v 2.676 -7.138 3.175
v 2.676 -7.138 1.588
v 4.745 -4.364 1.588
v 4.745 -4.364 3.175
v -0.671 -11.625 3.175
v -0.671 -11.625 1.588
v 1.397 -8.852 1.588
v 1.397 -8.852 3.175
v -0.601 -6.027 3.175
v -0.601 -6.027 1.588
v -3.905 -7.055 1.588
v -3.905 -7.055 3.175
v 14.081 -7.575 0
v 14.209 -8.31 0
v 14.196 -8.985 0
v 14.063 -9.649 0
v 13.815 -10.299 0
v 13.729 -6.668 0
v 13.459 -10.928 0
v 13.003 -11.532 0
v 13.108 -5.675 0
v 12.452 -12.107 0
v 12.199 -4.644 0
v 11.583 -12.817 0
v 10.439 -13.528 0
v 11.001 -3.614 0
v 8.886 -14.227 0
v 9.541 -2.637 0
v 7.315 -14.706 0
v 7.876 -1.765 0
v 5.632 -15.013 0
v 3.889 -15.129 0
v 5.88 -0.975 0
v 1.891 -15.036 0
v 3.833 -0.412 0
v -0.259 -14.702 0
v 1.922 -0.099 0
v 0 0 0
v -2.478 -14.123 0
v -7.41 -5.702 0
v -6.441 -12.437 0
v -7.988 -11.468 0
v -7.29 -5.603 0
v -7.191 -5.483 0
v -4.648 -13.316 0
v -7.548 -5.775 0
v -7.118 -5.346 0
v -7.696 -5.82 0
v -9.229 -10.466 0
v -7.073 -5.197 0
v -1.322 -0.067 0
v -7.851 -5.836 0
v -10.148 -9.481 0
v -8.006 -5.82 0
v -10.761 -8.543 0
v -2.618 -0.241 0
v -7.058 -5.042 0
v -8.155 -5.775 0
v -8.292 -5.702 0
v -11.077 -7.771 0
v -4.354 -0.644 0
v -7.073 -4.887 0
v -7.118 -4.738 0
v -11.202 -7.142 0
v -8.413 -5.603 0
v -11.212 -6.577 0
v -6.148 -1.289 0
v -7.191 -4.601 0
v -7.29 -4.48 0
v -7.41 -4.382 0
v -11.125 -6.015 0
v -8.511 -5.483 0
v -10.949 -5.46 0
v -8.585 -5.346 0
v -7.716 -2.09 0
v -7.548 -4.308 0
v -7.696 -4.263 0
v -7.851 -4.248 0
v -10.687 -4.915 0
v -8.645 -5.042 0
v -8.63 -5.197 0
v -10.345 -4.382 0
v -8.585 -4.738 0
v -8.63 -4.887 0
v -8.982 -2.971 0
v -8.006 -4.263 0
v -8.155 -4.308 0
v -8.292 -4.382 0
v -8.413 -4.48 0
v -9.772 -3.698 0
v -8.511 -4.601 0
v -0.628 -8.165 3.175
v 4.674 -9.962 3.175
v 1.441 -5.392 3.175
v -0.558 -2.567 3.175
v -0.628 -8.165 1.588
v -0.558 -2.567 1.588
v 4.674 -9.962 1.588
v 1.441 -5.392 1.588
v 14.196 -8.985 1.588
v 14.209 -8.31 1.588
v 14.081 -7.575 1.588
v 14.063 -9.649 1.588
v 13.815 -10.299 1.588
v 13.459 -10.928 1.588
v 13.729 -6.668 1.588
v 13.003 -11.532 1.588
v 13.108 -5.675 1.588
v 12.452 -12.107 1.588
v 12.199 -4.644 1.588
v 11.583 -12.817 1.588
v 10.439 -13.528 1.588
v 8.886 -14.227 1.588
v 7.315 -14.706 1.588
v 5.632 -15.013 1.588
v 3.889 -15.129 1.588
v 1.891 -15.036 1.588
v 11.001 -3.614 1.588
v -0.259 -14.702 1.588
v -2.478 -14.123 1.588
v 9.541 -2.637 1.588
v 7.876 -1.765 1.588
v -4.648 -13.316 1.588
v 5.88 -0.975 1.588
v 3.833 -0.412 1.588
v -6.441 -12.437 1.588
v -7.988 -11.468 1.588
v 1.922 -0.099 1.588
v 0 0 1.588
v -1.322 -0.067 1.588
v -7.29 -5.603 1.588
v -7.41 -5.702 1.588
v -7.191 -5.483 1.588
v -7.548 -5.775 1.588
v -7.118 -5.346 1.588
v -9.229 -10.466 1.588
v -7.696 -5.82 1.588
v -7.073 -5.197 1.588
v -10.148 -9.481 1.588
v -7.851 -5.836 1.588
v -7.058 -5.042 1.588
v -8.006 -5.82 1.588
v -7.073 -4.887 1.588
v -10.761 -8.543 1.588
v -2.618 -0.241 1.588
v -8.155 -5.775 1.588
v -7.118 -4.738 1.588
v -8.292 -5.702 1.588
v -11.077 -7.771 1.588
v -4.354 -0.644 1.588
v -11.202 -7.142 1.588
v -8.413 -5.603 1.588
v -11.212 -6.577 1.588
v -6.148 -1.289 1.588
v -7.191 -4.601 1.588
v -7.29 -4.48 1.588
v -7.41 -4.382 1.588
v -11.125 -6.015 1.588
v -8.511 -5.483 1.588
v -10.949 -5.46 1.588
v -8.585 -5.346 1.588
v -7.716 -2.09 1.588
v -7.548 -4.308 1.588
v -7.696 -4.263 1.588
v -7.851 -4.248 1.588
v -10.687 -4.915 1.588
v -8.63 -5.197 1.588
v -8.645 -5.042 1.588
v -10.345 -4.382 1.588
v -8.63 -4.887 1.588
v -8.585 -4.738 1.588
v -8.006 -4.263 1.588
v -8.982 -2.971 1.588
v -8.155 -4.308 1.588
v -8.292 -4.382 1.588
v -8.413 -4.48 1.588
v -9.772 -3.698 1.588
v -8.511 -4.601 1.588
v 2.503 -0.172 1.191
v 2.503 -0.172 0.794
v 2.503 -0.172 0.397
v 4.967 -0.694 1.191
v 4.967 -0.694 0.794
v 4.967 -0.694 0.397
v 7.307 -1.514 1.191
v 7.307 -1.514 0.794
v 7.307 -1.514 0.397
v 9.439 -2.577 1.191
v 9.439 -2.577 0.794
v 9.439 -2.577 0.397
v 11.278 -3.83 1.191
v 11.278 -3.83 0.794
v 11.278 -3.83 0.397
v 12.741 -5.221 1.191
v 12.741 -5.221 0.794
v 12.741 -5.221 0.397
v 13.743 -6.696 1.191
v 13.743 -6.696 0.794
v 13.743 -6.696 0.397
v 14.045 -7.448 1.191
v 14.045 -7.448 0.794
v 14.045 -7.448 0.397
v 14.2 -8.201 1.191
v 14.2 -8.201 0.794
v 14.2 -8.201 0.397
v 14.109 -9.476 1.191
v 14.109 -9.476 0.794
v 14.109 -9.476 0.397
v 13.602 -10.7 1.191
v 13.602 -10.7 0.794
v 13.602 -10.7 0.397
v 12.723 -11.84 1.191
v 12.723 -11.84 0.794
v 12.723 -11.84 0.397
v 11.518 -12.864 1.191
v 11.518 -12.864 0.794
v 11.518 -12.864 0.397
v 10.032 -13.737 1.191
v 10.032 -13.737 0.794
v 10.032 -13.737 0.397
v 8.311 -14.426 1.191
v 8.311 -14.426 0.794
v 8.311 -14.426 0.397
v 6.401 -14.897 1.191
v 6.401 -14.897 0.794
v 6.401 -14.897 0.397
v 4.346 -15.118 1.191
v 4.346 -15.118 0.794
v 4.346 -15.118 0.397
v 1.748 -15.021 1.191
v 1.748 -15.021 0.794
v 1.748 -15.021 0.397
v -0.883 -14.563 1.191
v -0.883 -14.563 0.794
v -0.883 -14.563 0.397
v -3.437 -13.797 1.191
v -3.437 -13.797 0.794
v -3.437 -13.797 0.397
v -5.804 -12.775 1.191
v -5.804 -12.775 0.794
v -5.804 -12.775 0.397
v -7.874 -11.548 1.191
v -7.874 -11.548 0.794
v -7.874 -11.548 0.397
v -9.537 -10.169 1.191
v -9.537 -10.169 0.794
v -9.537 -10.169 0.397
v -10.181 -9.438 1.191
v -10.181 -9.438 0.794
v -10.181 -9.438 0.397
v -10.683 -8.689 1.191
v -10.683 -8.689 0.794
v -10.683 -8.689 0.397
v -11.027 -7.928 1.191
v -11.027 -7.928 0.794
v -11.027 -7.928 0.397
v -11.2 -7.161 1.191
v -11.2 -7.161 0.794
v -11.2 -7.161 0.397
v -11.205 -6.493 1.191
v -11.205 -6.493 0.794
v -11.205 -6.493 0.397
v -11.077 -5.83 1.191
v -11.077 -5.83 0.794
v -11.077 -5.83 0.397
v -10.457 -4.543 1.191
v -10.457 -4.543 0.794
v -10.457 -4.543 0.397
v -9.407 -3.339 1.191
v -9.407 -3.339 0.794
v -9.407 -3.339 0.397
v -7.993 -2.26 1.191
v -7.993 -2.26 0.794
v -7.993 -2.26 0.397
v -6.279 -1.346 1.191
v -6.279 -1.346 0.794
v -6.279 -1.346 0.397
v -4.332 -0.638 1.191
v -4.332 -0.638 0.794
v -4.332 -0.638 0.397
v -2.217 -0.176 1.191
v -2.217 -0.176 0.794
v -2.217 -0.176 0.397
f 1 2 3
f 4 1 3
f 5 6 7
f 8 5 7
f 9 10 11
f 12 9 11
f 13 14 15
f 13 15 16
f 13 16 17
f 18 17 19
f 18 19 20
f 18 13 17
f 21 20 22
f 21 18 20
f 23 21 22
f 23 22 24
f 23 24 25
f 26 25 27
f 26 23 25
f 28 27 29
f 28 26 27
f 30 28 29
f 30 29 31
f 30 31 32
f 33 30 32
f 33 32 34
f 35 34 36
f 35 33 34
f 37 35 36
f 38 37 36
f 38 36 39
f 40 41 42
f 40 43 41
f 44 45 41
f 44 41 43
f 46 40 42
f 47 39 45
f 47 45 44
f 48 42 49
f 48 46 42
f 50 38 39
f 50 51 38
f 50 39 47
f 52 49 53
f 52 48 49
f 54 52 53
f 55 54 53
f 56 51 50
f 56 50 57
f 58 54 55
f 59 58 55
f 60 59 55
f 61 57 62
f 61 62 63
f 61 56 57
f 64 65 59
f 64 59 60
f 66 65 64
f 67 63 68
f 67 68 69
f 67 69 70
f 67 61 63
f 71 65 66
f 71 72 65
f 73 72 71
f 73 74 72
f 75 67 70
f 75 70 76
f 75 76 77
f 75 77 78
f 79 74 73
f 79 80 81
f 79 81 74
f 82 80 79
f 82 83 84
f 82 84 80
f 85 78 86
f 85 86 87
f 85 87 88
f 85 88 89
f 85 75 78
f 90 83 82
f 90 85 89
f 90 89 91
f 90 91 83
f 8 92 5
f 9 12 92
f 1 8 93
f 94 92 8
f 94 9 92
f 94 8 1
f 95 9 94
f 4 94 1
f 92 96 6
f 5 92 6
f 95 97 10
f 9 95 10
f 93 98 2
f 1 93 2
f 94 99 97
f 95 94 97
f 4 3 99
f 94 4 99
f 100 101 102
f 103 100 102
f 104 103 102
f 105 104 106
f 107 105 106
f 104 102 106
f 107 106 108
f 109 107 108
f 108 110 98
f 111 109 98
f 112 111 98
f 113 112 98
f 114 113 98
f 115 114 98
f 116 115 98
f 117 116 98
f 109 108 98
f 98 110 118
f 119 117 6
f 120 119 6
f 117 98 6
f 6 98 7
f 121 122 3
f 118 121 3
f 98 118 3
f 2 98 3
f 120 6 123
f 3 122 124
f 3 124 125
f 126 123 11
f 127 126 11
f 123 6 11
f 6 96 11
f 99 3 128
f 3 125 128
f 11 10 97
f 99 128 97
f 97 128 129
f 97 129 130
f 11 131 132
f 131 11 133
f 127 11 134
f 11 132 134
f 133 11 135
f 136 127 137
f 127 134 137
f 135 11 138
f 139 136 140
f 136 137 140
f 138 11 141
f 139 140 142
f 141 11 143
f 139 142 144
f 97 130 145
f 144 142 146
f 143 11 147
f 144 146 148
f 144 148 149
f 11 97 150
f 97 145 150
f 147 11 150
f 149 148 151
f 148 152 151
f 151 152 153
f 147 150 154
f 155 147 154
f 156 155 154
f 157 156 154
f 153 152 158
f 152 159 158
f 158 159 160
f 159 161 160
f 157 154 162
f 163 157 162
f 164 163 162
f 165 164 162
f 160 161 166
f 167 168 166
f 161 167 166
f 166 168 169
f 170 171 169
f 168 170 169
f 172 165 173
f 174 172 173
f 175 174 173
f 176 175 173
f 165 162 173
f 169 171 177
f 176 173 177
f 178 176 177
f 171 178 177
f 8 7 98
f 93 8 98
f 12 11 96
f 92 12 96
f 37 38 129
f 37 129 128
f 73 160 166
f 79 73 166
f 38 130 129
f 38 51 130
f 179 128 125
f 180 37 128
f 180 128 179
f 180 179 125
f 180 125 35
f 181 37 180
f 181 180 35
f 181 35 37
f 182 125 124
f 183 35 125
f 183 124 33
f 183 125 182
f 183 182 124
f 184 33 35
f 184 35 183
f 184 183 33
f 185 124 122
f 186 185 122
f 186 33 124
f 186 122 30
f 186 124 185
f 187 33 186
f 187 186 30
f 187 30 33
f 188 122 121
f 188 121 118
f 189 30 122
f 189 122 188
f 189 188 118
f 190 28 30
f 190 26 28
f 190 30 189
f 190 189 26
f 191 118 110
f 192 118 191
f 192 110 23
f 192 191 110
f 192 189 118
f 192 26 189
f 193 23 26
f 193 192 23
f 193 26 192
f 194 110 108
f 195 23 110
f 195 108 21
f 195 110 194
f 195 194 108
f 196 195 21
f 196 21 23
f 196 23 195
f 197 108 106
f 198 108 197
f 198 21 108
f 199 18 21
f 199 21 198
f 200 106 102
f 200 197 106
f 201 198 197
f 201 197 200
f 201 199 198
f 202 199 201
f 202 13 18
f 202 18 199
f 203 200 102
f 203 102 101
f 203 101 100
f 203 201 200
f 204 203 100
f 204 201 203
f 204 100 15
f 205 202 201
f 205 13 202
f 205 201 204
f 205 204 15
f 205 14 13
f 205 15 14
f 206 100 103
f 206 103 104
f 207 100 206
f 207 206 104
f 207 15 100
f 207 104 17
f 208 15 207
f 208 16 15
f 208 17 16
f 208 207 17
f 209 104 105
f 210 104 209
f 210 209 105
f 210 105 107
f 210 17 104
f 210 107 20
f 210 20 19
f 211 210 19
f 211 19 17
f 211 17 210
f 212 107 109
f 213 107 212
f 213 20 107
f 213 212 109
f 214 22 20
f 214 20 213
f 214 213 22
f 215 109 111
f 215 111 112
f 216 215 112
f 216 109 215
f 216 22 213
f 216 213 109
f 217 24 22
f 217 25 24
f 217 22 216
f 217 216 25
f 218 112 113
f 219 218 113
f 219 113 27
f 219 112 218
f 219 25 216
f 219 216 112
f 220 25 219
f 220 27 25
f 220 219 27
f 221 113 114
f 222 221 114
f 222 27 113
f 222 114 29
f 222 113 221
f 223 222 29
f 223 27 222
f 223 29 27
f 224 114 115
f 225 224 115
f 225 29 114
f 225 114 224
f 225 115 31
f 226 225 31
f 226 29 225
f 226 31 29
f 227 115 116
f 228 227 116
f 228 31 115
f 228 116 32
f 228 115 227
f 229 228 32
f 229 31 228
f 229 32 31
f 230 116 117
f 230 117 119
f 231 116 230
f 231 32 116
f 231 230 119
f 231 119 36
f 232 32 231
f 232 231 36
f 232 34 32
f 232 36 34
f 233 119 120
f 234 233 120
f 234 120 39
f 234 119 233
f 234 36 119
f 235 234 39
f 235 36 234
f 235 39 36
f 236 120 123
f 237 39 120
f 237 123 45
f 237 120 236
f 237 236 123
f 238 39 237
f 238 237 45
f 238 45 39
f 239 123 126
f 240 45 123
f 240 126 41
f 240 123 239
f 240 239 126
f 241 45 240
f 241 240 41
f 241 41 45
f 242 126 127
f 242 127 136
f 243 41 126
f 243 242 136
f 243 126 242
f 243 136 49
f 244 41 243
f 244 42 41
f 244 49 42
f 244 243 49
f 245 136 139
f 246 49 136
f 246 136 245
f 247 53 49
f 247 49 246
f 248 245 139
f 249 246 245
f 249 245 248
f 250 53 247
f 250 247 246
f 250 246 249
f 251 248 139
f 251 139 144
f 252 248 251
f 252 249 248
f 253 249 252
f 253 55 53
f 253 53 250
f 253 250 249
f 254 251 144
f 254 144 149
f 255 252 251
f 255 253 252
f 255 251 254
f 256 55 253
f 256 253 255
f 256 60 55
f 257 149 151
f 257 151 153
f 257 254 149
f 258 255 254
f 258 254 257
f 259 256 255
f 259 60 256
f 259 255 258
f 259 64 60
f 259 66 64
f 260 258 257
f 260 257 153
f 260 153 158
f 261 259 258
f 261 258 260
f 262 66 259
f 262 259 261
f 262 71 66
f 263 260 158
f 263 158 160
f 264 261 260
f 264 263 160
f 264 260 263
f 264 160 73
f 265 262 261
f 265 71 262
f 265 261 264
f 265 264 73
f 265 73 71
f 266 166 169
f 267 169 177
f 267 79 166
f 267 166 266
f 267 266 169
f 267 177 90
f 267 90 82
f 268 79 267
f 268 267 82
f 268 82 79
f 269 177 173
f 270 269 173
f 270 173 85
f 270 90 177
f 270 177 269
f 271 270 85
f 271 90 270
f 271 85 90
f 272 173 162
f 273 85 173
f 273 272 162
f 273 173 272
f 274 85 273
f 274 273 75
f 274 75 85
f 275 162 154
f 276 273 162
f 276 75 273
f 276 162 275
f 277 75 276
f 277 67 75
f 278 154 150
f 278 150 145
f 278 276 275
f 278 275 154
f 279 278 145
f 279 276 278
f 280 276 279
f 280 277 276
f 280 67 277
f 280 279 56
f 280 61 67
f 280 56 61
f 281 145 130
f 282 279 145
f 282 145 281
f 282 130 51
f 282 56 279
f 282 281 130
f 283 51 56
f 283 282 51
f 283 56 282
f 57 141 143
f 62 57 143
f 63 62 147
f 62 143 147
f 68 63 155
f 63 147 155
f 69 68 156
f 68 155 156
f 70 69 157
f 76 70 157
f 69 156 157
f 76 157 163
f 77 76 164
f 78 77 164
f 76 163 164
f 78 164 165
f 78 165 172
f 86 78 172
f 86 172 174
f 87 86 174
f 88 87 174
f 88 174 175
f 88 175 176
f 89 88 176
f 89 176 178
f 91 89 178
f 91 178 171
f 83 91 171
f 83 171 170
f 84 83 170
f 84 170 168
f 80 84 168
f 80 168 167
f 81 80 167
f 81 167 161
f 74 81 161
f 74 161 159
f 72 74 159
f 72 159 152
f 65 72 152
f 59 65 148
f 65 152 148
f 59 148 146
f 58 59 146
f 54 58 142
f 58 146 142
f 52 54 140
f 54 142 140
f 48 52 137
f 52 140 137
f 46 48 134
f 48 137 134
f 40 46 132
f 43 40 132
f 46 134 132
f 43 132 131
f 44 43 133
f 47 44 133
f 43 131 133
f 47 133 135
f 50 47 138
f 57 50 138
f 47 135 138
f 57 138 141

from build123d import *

# Parameters (mm, degrees)
F1_DEPTH = 1.5875
F3_DEPTH = 1.5875
F4_R     = 0.79375
F5_DEPTH = 25.4


with BuildPart() as f1:
    # F0 (on Top) → F1 (new body)
    with BuildSketch(Plane.XY):
        with BuildLine():
            add(Edge.make_bspline(
                [(0, 0), (6.6523111957, 0.0557712568), (19.896266254, -7.833527293), (4.4657572226, -18.8183048329), (-18.0090351962, -7.6475541783), (-5.989720748, -0.0502162698), (0, 0)],
                knots=[0, 0, 0, 0, 0.2639060181, 0.4900307759, 0.7623798247, 1, 1, 1, 1], degree=3))
        make_face()
    extrude(amount=F1_DEPTH)

    # F2 (on face) → F3 (join)
    with BuildSketch(Plane.XY.offset(1.5875)):
        Polygon((1.3973190894, -8.8517820117), (2.675915361, -7.1376187763), (1.4407572228, -5.3918958896), (-0.6012087597, -6.0271430461), (-0.6280550025, -8.1654702668), align=None)
        Polygon((1.3973190894, -8.8517820117), (4.6744432101, -9.9622577419), (2.675915361, -7.1376187763), align=None)
        Polygon((-0.6280550025, -8.1654702668), (-0.6714931359, -11.6253563889), (1.3973190894, -8.8517820117), align=None)
        Polygon((-0.6012087597, -6.0271430461), (-3.9051791232, -7.0549945366), (-0.6280550025, -8.1654702668), align=None)
        Polygon((2.675915361, -7.1376187763), (4.7447275863, -4.3640443991), (1.4407572228, -5.3918958896), align=None)
        Polygon((1.4407572228, -5.3918958896), (-0.5577706263, -2.567256924), (-0.6012087597, -6.0271430461), align=None)
    extrude(amount=F3_DEPTH)

    # F4 (on face) → F5 (cut)
    with BuildSketch(Plane.XY.offset(1.5875)):
        with Locations((-7.8512718901, -5.0417510793)):
            Circle(F4_R)
    extrude(amount=-F5_DEPTH, mode=Mode.SUBTRACT)


solid = f1.part
